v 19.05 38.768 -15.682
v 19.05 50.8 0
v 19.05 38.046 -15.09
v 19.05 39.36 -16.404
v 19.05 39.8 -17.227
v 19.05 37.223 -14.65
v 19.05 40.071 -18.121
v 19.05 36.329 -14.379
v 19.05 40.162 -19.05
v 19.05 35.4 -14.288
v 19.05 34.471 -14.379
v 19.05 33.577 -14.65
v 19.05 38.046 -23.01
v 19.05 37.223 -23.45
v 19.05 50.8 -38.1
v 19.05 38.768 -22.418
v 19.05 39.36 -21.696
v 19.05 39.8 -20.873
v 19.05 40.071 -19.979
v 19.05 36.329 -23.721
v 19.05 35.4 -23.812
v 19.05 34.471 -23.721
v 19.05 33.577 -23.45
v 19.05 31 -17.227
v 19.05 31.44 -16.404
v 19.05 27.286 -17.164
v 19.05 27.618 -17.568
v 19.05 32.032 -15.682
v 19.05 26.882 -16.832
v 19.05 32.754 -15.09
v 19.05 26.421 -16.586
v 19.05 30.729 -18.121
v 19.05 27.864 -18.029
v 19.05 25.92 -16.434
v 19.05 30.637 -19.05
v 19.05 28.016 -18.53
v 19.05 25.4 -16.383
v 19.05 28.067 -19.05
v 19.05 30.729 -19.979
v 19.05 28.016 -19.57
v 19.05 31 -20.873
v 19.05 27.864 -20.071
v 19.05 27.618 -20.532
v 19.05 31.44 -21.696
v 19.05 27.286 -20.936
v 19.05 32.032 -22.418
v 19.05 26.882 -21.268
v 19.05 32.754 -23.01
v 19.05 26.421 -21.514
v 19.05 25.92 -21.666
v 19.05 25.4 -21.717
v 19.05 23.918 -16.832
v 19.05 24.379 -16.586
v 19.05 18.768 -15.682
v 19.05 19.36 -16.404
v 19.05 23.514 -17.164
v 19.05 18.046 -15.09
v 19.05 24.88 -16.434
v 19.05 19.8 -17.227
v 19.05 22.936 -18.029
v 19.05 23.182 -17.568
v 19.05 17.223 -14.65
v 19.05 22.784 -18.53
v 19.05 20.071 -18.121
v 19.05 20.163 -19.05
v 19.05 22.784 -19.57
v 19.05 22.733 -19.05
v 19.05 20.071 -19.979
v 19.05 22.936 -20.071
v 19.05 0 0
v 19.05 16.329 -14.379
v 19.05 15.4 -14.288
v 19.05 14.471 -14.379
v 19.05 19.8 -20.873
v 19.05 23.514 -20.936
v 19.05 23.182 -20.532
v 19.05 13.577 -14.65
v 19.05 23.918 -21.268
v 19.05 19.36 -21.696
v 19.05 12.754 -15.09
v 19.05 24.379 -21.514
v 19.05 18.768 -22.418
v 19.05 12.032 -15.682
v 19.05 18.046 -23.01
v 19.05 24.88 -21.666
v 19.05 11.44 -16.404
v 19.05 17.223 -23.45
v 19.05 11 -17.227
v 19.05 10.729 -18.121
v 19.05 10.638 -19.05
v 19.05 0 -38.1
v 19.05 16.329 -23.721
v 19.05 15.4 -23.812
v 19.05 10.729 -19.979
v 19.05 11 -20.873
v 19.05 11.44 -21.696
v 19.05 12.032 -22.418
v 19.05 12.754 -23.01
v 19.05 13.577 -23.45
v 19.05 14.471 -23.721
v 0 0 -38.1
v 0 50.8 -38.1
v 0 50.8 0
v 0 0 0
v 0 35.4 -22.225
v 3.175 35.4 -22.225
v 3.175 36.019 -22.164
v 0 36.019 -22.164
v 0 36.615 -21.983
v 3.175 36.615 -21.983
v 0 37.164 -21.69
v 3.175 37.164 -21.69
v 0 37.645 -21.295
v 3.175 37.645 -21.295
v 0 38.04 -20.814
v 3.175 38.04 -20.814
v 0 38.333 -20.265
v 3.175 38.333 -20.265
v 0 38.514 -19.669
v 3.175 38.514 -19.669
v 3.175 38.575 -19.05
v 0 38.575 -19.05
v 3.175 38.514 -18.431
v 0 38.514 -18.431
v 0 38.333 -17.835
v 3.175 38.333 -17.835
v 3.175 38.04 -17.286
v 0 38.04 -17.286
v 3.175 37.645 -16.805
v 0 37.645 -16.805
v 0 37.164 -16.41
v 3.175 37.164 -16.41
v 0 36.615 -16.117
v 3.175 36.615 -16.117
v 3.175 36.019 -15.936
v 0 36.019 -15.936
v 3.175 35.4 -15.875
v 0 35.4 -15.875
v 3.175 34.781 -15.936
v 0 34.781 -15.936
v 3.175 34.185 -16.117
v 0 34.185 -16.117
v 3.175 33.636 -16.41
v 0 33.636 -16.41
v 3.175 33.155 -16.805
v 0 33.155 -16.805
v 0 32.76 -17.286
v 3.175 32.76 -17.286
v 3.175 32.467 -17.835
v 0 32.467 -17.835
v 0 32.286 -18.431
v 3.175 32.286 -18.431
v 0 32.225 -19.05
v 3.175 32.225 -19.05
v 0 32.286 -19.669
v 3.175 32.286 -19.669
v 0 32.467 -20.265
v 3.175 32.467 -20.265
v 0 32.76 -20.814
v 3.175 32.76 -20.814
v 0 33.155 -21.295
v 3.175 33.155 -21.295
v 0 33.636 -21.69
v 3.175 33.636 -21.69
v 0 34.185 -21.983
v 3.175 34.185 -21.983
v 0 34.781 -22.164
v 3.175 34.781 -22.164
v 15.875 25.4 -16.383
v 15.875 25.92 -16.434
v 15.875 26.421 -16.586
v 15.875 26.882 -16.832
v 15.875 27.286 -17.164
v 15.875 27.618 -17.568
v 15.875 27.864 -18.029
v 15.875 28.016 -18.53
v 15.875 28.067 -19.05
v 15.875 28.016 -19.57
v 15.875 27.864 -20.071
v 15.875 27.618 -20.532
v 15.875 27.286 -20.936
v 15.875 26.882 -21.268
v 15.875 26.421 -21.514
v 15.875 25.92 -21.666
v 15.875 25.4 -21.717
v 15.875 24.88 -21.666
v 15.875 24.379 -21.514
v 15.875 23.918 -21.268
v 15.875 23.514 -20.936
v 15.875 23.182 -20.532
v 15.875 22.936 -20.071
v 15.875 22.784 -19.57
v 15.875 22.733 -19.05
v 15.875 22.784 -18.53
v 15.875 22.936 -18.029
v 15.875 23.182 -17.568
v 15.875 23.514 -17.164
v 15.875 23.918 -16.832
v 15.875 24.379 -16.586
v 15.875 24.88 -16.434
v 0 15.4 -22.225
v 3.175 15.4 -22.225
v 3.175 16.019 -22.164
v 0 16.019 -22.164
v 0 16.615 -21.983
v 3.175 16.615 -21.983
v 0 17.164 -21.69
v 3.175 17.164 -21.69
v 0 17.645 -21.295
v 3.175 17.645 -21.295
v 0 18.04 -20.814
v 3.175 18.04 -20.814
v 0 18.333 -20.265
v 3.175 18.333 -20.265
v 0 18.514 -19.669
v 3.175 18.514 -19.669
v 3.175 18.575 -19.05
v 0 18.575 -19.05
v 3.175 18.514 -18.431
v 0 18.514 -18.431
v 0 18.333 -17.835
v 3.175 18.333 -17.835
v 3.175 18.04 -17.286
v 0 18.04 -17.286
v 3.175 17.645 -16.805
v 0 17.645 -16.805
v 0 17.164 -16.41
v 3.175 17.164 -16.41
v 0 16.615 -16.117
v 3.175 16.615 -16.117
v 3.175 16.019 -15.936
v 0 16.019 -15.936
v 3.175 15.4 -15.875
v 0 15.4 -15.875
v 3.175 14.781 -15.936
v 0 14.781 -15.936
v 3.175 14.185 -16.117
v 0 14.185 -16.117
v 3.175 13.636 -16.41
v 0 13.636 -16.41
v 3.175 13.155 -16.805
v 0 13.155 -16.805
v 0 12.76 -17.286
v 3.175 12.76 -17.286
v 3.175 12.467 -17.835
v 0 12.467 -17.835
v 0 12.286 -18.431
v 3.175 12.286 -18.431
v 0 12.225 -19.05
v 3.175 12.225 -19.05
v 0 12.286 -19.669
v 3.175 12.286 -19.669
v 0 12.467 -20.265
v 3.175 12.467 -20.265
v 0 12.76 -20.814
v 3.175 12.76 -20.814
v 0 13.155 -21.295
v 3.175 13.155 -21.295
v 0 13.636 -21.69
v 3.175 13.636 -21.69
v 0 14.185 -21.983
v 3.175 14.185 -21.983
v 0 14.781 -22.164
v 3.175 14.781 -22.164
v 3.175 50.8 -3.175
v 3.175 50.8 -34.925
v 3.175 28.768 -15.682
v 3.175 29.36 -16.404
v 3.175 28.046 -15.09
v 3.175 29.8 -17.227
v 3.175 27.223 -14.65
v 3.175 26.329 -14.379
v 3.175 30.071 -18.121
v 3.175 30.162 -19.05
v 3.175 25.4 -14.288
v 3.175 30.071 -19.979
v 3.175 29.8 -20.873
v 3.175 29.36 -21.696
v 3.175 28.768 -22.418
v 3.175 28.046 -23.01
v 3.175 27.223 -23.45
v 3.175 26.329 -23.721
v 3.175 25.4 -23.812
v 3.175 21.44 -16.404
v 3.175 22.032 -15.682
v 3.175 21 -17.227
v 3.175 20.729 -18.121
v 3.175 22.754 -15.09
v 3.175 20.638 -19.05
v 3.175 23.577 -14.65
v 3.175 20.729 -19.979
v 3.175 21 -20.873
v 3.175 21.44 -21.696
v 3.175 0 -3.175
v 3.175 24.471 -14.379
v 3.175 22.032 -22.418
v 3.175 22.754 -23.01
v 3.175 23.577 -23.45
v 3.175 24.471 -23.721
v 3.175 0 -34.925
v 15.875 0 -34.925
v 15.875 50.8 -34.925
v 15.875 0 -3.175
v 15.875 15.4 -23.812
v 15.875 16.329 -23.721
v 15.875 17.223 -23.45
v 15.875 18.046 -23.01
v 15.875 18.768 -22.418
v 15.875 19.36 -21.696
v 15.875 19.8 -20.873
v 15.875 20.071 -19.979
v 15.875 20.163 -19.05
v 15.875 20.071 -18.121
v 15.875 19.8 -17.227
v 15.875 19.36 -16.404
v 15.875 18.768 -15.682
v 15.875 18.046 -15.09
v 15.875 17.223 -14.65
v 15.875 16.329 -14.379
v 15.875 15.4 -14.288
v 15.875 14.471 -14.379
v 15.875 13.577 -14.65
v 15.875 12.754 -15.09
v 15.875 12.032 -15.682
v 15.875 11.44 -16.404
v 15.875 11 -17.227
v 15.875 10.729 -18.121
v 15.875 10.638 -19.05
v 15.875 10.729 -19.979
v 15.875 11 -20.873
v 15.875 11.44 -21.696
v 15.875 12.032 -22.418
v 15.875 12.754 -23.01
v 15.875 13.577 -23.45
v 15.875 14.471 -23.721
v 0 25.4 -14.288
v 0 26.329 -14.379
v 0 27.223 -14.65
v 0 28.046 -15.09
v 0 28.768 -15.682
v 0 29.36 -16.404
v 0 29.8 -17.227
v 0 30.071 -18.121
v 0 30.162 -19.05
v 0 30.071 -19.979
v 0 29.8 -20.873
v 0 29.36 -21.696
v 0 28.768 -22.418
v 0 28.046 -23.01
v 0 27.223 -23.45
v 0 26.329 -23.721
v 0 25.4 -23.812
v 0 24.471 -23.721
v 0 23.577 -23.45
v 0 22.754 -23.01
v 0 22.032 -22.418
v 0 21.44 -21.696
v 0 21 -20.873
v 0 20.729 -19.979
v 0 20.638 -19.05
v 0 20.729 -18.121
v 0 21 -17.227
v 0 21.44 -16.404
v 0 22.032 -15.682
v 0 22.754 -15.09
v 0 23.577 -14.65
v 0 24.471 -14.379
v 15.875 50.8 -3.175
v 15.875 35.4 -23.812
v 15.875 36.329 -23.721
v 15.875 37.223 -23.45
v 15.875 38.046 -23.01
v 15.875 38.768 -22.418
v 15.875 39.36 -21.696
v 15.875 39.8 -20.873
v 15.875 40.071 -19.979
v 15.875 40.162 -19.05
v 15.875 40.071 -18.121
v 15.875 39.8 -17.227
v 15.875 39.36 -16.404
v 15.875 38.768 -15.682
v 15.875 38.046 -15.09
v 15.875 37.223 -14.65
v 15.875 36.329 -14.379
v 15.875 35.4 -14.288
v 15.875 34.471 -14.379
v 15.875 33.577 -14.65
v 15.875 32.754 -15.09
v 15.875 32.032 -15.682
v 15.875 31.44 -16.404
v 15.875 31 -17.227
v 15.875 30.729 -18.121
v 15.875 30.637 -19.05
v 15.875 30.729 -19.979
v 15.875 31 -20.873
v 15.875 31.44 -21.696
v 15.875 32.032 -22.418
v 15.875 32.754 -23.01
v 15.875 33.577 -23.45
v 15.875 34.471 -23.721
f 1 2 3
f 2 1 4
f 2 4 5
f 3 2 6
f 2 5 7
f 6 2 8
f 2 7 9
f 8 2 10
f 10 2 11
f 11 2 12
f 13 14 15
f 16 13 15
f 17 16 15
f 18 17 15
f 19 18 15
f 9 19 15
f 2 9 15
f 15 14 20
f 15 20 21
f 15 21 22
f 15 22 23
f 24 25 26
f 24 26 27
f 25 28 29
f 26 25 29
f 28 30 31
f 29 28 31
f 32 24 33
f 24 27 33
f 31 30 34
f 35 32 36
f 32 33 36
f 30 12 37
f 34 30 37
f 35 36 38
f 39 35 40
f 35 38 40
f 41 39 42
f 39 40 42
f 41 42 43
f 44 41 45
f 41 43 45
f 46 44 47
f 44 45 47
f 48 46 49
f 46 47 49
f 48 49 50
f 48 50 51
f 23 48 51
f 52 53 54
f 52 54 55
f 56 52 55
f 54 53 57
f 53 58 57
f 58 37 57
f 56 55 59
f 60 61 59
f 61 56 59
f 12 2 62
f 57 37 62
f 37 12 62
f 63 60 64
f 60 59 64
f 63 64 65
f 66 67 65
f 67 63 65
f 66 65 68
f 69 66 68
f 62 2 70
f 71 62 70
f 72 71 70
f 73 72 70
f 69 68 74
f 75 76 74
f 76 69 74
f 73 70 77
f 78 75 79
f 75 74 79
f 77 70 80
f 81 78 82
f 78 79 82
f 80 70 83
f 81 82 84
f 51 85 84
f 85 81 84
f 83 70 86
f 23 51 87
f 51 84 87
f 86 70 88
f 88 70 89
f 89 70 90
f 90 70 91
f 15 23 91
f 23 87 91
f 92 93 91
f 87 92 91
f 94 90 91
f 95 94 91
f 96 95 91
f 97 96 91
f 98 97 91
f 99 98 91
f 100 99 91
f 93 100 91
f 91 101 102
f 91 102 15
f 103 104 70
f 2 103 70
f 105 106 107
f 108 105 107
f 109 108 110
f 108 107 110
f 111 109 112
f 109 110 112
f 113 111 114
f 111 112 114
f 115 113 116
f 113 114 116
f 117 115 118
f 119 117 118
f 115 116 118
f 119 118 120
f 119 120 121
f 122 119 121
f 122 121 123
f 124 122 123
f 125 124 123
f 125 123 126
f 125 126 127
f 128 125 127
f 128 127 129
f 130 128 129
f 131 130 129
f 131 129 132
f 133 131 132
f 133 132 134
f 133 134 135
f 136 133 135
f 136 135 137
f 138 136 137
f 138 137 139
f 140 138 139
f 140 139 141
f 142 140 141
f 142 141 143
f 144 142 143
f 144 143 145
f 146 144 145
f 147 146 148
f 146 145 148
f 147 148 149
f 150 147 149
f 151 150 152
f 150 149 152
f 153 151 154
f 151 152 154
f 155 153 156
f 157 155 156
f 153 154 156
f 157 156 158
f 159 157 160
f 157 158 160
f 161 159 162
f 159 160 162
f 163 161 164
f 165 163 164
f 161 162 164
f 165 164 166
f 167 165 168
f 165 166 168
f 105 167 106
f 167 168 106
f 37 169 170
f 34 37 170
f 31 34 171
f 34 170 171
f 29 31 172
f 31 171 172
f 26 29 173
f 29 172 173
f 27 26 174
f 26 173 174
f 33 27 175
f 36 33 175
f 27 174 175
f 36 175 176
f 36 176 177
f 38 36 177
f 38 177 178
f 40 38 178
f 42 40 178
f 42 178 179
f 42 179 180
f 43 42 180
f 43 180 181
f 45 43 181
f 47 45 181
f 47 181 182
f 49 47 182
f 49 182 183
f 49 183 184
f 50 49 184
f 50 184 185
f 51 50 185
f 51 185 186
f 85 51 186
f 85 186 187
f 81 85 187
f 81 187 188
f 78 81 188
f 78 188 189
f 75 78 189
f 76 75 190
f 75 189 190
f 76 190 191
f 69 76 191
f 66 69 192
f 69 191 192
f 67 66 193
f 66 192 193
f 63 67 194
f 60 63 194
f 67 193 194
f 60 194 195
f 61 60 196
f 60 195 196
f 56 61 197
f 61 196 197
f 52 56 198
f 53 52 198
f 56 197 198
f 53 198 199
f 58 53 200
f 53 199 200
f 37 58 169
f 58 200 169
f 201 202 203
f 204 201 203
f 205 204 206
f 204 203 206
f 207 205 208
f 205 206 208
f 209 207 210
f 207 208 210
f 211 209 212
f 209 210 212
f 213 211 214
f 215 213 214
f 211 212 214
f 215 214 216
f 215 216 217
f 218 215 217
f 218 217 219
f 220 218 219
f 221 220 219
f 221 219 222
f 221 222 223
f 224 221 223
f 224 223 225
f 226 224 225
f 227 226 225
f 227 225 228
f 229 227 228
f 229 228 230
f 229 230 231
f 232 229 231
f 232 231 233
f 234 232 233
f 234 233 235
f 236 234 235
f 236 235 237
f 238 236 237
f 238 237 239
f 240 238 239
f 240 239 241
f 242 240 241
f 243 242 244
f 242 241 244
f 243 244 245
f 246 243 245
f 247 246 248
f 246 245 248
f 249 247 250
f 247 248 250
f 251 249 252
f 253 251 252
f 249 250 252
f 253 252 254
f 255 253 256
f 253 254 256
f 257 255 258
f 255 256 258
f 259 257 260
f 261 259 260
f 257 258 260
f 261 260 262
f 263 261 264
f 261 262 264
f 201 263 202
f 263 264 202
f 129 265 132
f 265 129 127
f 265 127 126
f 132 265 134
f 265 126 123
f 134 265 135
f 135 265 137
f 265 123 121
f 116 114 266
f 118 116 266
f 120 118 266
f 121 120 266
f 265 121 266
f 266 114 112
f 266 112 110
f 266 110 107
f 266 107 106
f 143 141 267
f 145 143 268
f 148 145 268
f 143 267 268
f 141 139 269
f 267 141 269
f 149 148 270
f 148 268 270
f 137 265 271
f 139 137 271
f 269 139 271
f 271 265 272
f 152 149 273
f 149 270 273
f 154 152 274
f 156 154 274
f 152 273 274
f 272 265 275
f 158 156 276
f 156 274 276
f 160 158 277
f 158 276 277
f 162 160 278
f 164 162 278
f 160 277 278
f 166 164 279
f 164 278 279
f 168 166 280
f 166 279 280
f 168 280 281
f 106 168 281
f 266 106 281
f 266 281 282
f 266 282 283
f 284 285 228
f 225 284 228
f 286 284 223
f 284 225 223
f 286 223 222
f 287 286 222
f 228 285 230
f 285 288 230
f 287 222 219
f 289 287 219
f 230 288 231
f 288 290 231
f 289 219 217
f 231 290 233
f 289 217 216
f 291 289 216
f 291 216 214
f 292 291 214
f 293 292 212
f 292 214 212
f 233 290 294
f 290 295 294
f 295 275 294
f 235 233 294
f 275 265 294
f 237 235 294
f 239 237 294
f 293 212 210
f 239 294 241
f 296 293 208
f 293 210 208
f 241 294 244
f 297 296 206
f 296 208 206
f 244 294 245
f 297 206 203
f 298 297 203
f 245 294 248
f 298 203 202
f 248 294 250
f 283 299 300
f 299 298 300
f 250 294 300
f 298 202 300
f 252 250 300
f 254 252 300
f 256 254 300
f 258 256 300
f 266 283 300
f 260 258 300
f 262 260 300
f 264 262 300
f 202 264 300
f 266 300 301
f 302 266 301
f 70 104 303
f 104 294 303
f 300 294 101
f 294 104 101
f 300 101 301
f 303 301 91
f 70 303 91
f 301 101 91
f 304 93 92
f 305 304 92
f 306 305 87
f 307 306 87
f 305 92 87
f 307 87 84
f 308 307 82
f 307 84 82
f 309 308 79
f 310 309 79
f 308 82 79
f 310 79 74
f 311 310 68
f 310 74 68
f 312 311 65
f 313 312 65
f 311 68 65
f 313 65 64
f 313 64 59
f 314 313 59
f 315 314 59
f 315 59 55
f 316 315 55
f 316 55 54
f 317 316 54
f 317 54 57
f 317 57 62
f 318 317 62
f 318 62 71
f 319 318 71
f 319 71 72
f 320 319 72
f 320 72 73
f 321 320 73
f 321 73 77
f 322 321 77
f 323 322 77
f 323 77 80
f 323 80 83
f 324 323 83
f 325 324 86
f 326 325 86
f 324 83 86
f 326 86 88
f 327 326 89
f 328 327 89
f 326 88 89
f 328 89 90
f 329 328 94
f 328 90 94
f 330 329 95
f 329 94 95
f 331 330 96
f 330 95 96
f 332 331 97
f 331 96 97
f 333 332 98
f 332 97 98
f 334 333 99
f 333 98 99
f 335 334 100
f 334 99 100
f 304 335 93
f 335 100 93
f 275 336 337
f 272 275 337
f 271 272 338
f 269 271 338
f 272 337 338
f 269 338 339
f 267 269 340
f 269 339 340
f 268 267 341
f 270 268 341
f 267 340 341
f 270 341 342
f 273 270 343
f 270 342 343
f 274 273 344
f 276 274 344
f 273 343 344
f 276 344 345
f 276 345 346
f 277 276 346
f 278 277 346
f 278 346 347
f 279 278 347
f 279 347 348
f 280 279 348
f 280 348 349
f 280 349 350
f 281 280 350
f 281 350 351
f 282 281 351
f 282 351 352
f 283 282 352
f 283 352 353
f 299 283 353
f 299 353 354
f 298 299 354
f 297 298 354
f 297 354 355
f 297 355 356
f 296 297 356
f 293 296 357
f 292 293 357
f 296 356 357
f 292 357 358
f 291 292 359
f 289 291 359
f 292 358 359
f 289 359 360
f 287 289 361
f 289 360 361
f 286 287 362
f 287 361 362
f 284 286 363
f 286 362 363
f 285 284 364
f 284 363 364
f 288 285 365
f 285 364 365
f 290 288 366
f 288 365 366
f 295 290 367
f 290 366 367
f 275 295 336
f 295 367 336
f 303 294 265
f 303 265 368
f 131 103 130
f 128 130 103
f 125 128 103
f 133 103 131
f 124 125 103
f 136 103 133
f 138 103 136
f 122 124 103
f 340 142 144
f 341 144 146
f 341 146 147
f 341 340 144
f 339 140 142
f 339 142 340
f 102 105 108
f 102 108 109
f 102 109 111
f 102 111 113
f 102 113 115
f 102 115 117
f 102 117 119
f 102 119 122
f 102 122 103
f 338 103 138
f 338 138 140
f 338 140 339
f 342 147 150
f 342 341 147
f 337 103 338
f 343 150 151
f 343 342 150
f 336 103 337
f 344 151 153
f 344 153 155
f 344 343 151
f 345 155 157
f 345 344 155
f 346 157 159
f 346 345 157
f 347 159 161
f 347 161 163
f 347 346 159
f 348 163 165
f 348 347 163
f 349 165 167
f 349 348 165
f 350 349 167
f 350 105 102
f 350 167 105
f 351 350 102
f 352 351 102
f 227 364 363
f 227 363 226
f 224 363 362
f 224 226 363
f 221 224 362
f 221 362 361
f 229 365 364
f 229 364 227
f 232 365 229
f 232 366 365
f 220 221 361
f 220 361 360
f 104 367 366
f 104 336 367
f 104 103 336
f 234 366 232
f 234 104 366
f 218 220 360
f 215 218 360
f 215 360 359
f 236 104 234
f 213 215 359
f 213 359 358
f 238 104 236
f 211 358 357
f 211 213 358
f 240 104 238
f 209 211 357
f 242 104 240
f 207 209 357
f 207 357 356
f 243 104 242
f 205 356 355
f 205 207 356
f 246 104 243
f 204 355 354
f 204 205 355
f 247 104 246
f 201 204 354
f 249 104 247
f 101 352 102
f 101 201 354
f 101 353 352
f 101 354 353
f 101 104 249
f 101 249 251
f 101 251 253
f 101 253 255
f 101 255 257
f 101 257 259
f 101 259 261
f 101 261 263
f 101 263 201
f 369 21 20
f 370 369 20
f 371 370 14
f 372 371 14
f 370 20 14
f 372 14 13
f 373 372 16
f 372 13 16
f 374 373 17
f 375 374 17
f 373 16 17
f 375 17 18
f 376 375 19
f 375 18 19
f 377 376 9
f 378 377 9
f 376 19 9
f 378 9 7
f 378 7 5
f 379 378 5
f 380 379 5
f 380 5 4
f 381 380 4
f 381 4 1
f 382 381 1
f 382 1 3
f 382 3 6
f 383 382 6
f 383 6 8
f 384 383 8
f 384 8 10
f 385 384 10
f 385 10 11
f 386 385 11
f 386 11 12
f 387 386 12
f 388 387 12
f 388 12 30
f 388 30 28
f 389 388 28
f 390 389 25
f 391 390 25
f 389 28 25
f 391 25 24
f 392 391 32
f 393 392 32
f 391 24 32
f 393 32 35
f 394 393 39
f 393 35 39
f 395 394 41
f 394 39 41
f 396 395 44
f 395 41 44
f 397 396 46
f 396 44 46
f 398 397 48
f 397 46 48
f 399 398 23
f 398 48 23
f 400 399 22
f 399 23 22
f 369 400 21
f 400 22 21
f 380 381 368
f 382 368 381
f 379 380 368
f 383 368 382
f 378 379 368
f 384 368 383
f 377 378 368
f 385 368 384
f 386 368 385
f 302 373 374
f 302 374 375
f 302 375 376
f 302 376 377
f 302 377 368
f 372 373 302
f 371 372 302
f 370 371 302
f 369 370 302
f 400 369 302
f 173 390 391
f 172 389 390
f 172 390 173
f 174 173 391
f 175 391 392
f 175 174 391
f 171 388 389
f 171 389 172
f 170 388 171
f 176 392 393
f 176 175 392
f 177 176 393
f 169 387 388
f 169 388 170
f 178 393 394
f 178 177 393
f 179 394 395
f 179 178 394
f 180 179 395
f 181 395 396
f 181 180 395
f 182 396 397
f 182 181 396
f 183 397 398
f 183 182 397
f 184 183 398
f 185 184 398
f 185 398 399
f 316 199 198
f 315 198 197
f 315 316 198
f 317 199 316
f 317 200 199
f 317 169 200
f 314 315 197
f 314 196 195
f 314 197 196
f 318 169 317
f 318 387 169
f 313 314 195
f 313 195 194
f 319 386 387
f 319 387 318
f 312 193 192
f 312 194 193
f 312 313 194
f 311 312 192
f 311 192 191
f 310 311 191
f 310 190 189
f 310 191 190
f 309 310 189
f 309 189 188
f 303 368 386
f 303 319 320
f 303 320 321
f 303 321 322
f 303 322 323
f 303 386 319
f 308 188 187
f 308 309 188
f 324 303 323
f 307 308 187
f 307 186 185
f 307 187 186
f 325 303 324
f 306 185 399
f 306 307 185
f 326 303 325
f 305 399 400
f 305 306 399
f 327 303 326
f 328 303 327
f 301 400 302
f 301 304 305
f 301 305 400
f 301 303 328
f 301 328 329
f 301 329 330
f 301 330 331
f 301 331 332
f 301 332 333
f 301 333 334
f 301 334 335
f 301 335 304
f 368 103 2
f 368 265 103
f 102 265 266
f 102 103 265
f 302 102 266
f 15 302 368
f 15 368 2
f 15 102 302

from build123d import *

# Parameters (mm, degrees)
SKETCH1_W           = 19.05
SKETCH1_H           = 38.1
SKETCH1_W_2         = 12.7
SKETCH1_H_2         = 31.75
BOSS_EXTRUDE1_DEPTH = 50.8
SKETCH2_R           = 3.175
CUT_EXTRUDE1_DEPTH  = 20.05
CUT_EXTRUDE2_REACH  = 21.05
SKETCH3_R           = 4.7625
SKETCH4_R           = 2.667
CUT_EXTRUDE3_DEPTH  = 20.05
CUT_EXTRUDE4_REACH  = 21.05
SKETCH5_R           = 4.7625


with BuildPart() as part:
    # Sketch1 → Boss-Extrude1 (new body)
    with BuildSketch(Plane(origin=(0, 0, 0), x_dir=(1, 0, 0), z_dir=(0, 1, 0))):
        with Locations((9.525, 19.05)):
            Rectangle(SKETCH1_W, SKETCH1_H)
        with Locations((9.525, 19.05)):
            Rectangle(SKETCH1_W_2, SKETCH1_H_2, mode=Mode.SUBTRACT)
    extrude(amount=BOSS_EXTRUDE1_DEPTH)

    # Sketch2 → Cut-Extrude1 (cut, through all)
    with BuildSketch(Plane(origin=(19.05, 0, 0), x_dir=(0, 0, -1), z_dir=(1, 0, 0))):
        with Locations((19.05, 15.40002)):
            Circle(SKETCH2_R)
        with Locations((19.05, 35.39998)):
            Circle(SKETCH2_R)
    extrude(amount=-CUT_EXTRUDE1_DEPTH, mode=Mode.SUBTRACT)

    # Sketch3 → Cut-Extrude2 (cut, up to next)
    with BuildSketch(Plane(origin=(19.05, 0, 0), x_dir=(0, 0, -1), z_dir=(1, 0, 0)), mode=Mode.PRIVATE) as cut_extrude2_sk1:
        with Locations((19.05, 15.40002)):
            Circle(SKETCH3_R)
    cut_extrude2_tool1 = extrude(cut_extrude2_sk1.sketch, amount=-CUT_EXTRUDE2_REACH, mode=Mode.PRIVATE) & part.part
    add(cut_extrude2_tool1.solids().sort_by_distance((19.05, 15.40002, -19.05))[0], mode=Mode.SUBTRACT)
    # Sketch3 → Cut-Extrude2 (cut, up to next)
    with BuildSketch(Plane(origin=(19.05, 0, 0), x_dir=(0, 0, -1), z_dir=(1, 0, 0)), mode=Mode.PRIVATE) as cut_extrude2_sk2:
        with Locations((19.05, 35.39998)):
            Circle(SKETCH3_R)
    cut_extrude2_tool2 = extrude(cut_extrude2_sk2.sketch, amount=-CUT_EXTRUDE2_REACH, mode=Mode.PRIVATE) & part.part
    add(cut_extrude2_tool2.solids().sort_by_distance((19.05, 35.39998, -19.05))[0], mode=Mode.SUBTRACT)

    # Sketch4 → Cut-Extrude3 (cut, through all)
    with BuildSketch(Plane.ZY):
        with Locations((-19.05, 25.4)):
            Circle(SKETCH4_R)
    extrude(amount=-CUT_EXTRUDE3_DEPTH, mode=Mode.SUBTRACT)

    # Sketch5 → Cut-Extrude4 (cut, up to next)
    with BuildSketch(Plane.ZY, mode=Mode.PRIVATE) as cut_extrude4_sk1:
        with Locations((-19.05, 25.4)):
            Circle(SKETCH5_R)
    cut_extrude4_tool1 = extrude(cut_extrude4_sk1.sketch, amount=-CUT_EXTRUDE4_REACH, mode=Mode.PRIVATE) & part.part
    add(cut_extrude4_tool1.solids().sort_by_distance((0, 25.4, -19.05))[0], mode=Mode.SUBTRACT)


solid = part.part
